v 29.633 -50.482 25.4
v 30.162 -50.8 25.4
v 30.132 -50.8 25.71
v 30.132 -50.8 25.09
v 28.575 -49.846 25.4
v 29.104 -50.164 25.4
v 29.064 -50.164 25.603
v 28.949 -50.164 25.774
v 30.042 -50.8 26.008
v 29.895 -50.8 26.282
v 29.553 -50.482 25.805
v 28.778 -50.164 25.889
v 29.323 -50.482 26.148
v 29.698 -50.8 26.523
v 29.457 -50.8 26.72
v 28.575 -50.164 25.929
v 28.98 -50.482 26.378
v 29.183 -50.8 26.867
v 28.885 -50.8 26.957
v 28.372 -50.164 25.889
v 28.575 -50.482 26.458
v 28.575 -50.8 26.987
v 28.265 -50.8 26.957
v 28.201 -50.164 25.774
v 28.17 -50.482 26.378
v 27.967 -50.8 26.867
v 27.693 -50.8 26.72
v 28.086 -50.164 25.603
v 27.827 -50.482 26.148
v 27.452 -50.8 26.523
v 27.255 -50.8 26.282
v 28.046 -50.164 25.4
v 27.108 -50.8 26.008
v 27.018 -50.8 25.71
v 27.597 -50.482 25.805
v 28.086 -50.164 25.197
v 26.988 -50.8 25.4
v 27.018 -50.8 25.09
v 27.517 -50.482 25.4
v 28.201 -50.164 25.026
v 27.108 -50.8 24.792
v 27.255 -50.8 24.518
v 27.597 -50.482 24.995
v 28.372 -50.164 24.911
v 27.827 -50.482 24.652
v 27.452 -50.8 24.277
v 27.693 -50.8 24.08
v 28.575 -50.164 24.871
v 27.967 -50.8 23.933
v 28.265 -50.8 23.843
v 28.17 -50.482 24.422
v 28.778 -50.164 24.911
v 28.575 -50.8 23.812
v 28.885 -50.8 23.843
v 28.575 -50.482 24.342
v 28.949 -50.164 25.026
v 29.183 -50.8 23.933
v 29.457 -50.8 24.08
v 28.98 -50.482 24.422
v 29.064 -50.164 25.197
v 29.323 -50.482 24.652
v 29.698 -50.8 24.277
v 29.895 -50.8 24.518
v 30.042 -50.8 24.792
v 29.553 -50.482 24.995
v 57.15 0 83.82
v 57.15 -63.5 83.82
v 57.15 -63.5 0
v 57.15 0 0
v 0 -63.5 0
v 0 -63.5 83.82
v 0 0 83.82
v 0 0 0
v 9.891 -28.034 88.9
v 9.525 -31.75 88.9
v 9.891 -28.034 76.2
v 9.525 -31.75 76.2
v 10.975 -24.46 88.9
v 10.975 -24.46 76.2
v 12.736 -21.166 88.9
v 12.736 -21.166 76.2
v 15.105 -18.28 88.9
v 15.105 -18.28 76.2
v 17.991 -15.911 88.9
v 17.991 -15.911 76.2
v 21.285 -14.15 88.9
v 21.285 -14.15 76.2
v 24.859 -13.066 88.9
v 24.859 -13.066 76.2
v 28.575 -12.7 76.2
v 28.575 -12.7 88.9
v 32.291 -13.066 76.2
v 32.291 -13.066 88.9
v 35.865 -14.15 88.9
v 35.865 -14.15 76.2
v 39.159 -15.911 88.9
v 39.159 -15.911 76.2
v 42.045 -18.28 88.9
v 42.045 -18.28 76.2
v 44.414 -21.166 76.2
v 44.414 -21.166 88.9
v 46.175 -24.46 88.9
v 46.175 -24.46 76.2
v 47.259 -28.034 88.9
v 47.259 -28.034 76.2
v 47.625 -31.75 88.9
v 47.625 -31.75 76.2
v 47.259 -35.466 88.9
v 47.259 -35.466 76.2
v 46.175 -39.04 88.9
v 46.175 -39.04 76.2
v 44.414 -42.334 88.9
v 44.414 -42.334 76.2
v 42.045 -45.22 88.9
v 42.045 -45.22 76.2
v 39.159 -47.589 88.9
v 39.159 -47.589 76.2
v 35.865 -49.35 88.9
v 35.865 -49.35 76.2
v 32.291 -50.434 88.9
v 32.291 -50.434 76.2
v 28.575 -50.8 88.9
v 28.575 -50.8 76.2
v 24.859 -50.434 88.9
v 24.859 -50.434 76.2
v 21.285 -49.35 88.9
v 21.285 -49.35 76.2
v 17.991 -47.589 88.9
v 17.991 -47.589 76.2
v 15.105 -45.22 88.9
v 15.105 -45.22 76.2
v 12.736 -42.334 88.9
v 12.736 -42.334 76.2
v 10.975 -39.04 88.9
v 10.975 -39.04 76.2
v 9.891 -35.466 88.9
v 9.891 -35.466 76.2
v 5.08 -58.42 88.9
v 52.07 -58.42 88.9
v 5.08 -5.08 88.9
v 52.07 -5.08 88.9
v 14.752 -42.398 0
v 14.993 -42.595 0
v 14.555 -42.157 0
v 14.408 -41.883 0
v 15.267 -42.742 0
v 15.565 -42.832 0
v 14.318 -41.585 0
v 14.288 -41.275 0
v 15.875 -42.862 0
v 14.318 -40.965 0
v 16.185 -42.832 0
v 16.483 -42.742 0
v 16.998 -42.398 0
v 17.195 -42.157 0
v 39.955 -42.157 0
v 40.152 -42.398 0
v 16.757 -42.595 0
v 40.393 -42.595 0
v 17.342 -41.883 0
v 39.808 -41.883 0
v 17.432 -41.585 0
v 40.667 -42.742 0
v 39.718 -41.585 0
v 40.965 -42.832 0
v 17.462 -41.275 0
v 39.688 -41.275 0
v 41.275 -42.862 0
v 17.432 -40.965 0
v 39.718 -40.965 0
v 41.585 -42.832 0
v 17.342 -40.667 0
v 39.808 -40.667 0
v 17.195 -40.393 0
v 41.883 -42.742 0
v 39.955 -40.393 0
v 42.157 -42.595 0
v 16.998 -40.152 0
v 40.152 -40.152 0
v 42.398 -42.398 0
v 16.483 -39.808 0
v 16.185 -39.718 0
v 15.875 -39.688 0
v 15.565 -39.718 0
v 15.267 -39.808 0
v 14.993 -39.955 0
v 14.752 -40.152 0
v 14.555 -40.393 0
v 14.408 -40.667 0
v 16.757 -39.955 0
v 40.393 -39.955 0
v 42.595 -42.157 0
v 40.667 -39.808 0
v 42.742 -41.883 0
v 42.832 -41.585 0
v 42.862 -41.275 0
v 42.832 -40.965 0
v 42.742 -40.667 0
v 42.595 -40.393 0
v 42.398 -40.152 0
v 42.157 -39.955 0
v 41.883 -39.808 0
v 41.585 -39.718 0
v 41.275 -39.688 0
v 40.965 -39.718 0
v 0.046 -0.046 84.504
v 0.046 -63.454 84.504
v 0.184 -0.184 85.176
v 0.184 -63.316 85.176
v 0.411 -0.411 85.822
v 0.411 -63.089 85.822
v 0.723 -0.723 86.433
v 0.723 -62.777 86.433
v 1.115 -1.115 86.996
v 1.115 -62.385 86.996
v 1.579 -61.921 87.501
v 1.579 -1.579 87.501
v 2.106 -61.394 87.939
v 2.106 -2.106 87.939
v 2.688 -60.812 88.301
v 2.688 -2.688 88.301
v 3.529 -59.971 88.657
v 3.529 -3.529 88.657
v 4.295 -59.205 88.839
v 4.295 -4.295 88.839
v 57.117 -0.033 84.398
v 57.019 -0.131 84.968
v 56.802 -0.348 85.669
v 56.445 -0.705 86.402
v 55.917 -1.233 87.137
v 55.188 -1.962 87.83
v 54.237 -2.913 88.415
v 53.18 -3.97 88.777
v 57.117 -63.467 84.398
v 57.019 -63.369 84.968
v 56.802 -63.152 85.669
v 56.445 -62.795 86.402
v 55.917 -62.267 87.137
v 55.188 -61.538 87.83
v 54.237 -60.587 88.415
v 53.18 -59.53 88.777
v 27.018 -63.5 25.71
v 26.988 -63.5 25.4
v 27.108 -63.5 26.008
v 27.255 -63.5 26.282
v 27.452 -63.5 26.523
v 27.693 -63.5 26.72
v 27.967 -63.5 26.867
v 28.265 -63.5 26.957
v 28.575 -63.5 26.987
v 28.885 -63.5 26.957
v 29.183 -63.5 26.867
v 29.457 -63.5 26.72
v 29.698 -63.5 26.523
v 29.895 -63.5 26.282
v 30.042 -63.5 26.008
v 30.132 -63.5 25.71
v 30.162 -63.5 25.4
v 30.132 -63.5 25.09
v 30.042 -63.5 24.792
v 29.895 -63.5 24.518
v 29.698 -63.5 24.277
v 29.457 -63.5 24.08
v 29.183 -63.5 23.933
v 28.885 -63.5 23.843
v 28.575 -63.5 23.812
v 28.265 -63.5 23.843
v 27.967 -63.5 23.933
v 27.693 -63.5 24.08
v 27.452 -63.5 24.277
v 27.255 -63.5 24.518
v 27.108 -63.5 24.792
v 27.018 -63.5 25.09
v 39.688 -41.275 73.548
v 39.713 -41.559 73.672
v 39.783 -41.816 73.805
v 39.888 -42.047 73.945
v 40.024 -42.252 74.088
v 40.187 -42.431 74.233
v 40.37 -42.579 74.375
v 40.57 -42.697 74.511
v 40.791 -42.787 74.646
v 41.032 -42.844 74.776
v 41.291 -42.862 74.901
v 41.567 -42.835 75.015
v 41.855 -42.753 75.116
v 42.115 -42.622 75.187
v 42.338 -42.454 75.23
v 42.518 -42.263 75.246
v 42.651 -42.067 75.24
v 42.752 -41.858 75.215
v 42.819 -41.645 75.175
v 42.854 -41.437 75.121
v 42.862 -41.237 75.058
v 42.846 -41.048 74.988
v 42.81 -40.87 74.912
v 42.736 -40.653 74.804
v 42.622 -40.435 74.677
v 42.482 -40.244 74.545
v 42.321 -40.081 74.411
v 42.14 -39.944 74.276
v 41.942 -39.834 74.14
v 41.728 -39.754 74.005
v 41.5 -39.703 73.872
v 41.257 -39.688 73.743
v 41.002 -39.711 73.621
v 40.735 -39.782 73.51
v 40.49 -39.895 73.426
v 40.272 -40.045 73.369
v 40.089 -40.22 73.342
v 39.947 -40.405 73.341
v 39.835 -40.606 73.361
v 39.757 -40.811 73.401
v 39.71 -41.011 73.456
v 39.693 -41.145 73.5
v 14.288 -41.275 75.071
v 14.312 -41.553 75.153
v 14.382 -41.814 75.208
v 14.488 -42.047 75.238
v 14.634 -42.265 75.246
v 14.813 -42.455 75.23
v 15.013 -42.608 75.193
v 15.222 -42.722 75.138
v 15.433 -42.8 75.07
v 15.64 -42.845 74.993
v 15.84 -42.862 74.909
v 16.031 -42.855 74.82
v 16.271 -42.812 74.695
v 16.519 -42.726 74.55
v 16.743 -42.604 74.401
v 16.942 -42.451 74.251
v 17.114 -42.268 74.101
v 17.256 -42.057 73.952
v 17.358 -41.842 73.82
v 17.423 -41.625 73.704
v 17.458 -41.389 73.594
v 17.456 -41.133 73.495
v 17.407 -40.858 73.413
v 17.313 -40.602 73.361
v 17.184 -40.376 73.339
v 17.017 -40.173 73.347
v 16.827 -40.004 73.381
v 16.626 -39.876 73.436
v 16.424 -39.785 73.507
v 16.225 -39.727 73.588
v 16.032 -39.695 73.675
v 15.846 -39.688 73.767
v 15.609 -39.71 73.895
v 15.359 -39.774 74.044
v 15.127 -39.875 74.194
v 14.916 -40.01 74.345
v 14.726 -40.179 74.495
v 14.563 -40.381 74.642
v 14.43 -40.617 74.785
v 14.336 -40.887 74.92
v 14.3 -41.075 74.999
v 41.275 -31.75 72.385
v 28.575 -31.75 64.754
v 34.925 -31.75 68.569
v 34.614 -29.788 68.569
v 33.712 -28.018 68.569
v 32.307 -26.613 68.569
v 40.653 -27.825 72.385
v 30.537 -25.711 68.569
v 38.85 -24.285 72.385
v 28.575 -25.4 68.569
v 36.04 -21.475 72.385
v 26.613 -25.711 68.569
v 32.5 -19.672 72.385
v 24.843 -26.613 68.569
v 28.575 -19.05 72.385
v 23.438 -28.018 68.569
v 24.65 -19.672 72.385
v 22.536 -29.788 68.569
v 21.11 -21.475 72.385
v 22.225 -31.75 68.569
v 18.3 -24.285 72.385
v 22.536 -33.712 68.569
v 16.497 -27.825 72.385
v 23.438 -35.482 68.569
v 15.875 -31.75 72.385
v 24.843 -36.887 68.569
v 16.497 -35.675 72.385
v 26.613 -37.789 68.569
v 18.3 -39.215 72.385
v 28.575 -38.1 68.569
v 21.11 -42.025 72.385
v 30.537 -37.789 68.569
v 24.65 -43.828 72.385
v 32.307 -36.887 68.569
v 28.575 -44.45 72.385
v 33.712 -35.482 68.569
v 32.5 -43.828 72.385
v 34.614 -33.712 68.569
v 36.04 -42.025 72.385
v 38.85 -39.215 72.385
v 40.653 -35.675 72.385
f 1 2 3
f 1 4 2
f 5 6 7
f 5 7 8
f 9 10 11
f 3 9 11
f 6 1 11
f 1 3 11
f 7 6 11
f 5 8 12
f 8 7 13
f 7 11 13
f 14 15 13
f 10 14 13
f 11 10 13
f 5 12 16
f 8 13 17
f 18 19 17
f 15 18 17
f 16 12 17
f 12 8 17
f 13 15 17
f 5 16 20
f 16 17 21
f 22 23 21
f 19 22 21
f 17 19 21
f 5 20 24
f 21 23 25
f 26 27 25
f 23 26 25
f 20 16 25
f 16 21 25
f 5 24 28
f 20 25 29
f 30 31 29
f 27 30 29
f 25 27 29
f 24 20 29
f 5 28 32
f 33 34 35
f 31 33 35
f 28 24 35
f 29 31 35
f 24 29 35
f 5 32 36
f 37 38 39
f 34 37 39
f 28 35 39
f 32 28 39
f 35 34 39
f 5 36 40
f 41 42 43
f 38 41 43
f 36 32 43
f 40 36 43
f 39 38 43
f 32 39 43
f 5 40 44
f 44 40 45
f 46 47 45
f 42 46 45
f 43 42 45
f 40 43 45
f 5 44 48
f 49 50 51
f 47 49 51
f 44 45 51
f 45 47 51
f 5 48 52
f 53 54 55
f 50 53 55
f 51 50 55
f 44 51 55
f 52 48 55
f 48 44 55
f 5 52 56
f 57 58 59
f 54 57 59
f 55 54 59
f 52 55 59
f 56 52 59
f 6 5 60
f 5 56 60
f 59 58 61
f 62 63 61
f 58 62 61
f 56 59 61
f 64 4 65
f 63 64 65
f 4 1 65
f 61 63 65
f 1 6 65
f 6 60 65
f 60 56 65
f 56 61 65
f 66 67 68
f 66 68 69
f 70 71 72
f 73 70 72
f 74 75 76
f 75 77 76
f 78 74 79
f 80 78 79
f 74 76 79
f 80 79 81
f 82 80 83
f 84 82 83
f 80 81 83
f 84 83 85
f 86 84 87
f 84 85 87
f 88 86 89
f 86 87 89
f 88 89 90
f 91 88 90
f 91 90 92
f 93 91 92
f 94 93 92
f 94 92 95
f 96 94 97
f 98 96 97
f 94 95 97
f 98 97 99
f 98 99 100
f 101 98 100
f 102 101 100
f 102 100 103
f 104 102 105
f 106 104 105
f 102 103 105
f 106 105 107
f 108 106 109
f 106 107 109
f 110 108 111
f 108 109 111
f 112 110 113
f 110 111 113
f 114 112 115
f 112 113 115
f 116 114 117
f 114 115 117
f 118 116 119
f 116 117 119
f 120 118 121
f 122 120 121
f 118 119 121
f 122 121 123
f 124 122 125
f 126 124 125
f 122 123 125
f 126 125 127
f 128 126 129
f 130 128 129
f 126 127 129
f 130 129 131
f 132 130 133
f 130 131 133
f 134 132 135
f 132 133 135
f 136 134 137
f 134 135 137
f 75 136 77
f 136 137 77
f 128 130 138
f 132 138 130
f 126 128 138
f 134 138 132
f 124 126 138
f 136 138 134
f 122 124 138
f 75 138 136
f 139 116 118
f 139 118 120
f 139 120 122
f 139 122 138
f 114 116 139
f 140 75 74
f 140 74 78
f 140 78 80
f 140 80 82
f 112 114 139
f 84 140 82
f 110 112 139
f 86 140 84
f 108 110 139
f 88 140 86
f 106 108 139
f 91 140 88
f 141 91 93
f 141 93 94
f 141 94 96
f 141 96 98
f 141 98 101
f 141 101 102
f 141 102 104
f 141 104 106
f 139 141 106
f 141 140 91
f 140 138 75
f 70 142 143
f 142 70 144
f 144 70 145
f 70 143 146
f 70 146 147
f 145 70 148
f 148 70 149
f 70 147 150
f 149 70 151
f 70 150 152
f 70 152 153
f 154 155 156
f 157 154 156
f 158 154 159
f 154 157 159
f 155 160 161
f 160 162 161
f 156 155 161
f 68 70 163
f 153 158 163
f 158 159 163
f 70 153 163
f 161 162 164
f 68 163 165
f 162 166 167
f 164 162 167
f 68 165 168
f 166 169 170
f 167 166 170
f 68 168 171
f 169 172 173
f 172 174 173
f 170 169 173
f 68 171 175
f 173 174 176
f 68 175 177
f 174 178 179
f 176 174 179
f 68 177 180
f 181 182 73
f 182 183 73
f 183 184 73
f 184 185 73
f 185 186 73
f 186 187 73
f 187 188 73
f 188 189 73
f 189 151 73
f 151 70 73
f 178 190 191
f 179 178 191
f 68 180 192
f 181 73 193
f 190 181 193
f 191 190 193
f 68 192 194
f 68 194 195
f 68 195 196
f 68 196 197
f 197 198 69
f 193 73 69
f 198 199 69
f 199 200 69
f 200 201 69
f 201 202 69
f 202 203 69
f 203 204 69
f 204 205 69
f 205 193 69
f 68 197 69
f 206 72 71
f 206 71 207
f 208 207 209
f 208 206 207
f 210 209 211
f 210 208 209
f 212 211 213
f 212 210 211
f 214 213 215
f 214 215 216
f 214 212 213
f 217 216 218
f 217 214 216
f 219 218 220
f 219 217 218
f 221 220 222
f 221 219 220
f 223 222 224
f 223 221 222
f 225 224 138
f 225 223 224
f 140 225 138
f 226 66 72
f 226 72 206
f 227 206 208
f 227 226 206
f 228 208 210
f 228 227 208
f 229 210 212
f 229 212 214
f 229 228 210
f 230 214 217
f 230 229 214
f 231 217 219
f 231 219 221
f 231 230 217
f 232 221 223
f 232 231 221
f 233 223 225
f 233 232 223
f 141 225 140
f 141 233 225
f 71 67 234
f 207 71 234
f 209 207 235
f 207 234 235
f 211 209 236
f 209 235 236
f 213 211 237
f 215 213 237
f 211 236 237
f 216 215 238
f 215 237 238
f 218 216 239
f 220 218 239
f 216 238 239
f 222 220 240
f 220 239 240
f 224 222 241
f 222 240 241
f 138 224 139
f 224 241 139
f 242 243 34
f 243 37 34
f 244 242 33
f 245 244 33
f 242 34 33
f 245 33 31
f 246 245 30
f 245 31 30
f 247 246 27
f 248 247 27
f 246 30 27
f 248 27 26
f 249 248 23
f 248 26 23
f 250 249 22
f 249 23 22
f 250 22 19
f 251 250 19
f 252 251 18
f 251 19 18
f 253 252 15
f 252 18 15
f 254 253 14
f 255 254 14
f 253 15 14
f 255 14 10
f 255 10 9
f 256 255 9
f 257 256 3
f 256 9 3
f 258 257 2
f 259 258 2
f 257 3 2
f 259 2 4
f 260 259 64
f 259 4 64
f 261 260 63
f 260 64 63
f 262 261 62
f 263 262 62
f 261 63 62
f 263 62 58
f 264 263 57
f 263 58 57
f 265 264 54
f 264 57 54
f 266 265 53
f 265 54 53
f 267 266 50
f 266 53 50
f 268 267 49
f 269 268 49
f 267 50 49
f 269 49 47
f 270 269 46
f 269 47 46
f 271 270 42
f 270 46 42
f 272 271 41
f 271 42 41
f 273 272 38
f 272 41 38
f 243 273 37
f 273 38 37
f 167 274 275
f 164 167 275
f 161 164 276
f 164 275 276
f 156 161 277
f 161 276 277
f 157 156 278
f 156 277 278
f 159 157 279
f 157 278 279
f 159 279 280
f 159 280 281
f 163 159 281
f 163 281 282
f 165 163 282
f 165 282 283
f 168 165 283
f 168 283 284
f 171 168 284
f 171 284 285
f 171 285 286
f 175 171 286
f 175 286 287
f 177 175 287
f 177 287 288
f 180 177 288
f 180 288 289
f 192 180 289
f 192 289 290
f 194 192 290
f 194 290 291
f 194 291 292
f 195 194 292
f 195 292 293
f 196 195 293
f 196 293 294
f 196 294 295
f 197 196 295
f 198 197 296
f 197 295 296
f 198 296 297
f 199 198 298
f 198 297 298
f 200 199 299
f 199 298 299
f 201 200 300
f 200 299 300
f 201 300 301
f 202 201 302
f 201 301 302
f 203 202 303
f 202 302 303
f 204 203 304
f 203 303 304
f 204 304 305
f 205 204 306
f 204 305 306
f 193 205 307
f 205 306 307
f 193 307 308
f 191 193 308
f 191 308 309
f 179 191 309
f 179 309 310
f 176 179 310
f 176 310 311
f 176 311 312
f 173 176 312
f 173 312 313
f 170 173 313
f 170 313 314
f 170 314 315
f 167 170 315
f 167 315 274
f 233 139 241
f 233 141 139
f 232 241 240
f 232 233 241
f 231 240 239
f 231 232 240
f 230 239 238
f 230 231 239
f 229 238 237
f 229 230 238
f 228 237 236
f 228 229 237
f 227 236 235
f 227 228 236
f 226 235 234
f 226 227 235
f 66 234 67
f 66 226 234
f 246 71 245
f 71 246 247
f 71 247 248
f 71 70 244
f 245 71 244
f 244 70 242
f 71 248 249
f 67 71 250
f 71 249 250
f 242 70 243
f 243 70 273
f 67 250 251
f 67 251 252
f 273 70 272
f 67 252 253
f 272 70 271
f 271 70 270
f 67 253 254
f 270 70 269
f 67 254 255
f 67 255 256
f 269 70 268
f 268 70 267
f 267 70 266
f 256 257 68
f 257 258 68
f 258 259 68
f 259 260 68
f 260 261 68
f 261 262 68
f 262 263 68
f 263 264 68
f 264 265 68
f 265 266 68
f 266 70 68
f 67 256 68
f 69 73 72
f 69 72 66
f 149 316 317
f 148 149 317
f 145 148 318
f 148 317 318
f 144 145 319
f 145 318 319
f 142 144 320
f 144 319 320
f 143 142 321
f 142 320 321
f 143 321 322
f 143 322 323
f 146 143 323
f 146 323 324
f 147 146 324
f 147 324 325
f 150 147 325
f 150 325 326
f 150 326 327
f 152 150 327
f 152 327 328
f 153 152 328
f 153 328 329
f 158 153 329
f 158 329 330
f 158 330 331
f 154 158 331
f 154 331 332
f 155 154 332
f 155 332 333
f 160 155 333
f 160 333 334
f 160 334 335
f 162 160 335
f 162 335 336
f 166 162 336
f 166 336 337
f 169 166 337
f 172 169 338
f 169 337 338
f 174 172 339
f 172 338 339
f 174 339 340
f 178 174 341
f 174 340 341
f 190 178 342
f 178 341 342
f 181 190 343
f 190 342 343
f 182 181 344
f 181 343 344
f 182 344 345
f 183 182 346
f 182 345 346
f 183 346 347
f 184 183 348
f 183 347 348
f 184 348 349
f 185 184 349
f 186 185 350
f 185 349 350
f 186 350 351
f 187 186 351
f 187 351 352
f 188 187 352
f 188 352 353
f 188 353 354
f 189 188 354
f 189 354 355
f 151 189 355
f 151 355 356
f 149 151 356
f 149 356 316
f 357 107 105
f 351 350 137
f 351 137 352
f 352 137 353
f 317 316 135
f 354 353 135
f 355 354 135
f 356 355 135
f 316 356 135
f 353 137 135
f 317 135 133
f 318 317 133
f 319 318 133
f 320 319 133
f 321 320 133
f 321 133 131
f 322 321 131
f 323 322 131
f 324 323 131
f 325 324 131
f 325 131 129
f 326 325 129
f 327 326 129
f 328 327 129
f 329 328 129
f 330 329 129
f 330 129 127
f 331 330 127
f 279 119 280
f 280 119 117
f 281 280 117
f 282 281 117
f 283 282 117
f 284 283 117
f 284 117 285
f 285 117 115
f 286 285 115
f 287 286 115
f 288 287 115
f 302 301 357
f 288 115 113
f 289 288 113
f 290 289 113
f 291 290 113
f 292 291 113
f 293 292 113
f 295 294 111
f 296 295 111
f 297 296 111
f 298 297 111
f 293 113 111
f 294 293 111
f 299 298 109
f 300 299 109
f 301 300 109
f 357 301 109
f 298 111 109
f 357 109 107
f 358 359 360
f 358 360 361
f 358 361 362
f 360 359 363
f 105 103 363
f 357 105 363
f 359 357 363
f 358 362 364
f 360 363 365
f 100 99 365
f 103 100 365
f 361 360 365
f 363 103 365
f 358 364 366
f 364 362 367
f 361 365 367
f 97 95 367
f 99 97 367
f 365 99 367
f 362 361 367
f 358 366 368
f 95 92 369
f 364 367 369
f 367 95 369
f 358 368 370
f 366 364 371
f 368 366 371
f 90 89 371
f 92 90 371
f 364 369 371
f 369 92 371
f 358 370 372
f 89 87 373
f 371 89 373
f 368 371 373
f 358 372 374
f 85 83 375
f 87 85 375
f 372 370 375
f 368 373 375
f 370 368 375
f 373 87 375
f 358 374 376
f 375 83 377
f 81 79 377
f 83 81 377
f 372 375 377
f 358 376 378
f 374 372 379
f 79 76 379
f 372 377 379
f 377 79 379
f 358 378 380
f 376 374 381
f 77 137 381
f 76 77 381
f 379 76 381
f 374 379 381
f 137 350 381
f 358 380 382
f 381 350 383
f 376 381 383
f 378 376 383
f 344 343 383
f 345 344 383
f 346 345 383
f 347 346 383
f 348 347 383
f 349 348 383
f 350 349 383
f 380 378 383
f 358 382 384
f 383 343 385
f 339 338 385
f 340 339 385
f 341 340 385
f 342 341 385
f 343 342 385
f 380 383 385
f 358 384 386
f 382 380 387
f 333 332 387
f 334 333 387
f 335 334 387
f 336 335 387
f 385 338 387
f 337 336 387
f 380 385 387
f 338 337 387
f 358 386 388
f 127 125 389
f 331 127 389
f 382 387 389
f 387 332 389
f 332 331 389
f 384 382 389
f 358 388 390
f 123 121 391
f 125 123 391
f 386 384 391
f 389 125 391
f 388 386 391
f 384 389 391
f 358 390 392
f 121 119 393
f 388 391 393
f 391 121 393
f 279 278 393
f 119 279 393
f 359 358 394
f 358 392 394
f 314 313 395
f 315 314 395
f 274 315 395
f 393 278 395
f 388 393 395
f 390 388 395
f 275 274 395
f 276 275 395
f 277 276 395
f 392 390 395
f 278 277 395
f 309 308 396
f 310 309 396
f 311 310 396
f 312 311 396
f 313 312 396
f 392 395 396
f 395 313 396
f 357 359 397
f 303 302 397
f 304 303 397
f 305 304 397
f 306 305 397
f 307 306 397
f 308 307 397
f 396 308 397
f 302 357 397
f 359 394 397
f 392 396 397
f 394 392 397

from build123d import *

# Parameters (mm, degrees)
F0_W     = 57.15
F0_H     = 63.5
F1_DEPTH = 88.9
F3_D     = 38.1
F3_DEPTH = 12.7
F3_TIP   = 11.4463947925
F4_R     = 5.08
F6_D     = 3.175
F6_DEPTH = 12.7
F6_TIP   = 0.9538662327
F8_D     = 3.175


with BuildPart() as f1:
    # F0 (on Top) → F1 (new body)
    with BuildSketch(Plane.XY):
        with Locations((28.575, -31.75)):
            Rectangle(F0_W, F0_H)
    extrude(amount=F1_DEPTH)

    # F3
    with Locations(Plane.XY.offset(88.9)):
        with Locations((28.575, -31.75)):
            Hole(F3_D / 2, depth=F3_DEPTH)
            with Locations((0, 0, -(F3_DEPTH + F3_TIP / 2))):  # 118° drill point
                Cone(0, F3_D / 2, F3_TIP, mode=Mode.SUBTRACT)

    # F4
    f4_edges = [f1.edges().sort_by_distance(p)[0] for p in [
        (57.15, -31.75, 88.9),
        (28.575, 0, 88.9),
        (0, -31.75, 88.9),
        (28.575, -63.5, 88.9),
    ]]
    fillet(f4_edges, radius=F4_R)

    # F6
    with Locations(Plane.XZ.offset(63.5)):
        with Locations((28.575, 25.4)):
            Hole(F6_D / 2, depth=F6_DEPTH)
            with Locations((0, 0, -(F6_DEPTH + F6_TIP / 2))):  # 118° drill point
                Cone(0, F6_D / 2, F6_TIP, mode=Mode.SUBTRACT)

    # F8 (through all)
    with Locations(Plane(origin=(0, 0, 0), x_dir=(1, 0, 0), z_dir=(0, 0, -1))):
        with Locations((41.275, 41.275), (15.875, 41.275)):
            Hole(F8_D / 2)


solid = f1.part
